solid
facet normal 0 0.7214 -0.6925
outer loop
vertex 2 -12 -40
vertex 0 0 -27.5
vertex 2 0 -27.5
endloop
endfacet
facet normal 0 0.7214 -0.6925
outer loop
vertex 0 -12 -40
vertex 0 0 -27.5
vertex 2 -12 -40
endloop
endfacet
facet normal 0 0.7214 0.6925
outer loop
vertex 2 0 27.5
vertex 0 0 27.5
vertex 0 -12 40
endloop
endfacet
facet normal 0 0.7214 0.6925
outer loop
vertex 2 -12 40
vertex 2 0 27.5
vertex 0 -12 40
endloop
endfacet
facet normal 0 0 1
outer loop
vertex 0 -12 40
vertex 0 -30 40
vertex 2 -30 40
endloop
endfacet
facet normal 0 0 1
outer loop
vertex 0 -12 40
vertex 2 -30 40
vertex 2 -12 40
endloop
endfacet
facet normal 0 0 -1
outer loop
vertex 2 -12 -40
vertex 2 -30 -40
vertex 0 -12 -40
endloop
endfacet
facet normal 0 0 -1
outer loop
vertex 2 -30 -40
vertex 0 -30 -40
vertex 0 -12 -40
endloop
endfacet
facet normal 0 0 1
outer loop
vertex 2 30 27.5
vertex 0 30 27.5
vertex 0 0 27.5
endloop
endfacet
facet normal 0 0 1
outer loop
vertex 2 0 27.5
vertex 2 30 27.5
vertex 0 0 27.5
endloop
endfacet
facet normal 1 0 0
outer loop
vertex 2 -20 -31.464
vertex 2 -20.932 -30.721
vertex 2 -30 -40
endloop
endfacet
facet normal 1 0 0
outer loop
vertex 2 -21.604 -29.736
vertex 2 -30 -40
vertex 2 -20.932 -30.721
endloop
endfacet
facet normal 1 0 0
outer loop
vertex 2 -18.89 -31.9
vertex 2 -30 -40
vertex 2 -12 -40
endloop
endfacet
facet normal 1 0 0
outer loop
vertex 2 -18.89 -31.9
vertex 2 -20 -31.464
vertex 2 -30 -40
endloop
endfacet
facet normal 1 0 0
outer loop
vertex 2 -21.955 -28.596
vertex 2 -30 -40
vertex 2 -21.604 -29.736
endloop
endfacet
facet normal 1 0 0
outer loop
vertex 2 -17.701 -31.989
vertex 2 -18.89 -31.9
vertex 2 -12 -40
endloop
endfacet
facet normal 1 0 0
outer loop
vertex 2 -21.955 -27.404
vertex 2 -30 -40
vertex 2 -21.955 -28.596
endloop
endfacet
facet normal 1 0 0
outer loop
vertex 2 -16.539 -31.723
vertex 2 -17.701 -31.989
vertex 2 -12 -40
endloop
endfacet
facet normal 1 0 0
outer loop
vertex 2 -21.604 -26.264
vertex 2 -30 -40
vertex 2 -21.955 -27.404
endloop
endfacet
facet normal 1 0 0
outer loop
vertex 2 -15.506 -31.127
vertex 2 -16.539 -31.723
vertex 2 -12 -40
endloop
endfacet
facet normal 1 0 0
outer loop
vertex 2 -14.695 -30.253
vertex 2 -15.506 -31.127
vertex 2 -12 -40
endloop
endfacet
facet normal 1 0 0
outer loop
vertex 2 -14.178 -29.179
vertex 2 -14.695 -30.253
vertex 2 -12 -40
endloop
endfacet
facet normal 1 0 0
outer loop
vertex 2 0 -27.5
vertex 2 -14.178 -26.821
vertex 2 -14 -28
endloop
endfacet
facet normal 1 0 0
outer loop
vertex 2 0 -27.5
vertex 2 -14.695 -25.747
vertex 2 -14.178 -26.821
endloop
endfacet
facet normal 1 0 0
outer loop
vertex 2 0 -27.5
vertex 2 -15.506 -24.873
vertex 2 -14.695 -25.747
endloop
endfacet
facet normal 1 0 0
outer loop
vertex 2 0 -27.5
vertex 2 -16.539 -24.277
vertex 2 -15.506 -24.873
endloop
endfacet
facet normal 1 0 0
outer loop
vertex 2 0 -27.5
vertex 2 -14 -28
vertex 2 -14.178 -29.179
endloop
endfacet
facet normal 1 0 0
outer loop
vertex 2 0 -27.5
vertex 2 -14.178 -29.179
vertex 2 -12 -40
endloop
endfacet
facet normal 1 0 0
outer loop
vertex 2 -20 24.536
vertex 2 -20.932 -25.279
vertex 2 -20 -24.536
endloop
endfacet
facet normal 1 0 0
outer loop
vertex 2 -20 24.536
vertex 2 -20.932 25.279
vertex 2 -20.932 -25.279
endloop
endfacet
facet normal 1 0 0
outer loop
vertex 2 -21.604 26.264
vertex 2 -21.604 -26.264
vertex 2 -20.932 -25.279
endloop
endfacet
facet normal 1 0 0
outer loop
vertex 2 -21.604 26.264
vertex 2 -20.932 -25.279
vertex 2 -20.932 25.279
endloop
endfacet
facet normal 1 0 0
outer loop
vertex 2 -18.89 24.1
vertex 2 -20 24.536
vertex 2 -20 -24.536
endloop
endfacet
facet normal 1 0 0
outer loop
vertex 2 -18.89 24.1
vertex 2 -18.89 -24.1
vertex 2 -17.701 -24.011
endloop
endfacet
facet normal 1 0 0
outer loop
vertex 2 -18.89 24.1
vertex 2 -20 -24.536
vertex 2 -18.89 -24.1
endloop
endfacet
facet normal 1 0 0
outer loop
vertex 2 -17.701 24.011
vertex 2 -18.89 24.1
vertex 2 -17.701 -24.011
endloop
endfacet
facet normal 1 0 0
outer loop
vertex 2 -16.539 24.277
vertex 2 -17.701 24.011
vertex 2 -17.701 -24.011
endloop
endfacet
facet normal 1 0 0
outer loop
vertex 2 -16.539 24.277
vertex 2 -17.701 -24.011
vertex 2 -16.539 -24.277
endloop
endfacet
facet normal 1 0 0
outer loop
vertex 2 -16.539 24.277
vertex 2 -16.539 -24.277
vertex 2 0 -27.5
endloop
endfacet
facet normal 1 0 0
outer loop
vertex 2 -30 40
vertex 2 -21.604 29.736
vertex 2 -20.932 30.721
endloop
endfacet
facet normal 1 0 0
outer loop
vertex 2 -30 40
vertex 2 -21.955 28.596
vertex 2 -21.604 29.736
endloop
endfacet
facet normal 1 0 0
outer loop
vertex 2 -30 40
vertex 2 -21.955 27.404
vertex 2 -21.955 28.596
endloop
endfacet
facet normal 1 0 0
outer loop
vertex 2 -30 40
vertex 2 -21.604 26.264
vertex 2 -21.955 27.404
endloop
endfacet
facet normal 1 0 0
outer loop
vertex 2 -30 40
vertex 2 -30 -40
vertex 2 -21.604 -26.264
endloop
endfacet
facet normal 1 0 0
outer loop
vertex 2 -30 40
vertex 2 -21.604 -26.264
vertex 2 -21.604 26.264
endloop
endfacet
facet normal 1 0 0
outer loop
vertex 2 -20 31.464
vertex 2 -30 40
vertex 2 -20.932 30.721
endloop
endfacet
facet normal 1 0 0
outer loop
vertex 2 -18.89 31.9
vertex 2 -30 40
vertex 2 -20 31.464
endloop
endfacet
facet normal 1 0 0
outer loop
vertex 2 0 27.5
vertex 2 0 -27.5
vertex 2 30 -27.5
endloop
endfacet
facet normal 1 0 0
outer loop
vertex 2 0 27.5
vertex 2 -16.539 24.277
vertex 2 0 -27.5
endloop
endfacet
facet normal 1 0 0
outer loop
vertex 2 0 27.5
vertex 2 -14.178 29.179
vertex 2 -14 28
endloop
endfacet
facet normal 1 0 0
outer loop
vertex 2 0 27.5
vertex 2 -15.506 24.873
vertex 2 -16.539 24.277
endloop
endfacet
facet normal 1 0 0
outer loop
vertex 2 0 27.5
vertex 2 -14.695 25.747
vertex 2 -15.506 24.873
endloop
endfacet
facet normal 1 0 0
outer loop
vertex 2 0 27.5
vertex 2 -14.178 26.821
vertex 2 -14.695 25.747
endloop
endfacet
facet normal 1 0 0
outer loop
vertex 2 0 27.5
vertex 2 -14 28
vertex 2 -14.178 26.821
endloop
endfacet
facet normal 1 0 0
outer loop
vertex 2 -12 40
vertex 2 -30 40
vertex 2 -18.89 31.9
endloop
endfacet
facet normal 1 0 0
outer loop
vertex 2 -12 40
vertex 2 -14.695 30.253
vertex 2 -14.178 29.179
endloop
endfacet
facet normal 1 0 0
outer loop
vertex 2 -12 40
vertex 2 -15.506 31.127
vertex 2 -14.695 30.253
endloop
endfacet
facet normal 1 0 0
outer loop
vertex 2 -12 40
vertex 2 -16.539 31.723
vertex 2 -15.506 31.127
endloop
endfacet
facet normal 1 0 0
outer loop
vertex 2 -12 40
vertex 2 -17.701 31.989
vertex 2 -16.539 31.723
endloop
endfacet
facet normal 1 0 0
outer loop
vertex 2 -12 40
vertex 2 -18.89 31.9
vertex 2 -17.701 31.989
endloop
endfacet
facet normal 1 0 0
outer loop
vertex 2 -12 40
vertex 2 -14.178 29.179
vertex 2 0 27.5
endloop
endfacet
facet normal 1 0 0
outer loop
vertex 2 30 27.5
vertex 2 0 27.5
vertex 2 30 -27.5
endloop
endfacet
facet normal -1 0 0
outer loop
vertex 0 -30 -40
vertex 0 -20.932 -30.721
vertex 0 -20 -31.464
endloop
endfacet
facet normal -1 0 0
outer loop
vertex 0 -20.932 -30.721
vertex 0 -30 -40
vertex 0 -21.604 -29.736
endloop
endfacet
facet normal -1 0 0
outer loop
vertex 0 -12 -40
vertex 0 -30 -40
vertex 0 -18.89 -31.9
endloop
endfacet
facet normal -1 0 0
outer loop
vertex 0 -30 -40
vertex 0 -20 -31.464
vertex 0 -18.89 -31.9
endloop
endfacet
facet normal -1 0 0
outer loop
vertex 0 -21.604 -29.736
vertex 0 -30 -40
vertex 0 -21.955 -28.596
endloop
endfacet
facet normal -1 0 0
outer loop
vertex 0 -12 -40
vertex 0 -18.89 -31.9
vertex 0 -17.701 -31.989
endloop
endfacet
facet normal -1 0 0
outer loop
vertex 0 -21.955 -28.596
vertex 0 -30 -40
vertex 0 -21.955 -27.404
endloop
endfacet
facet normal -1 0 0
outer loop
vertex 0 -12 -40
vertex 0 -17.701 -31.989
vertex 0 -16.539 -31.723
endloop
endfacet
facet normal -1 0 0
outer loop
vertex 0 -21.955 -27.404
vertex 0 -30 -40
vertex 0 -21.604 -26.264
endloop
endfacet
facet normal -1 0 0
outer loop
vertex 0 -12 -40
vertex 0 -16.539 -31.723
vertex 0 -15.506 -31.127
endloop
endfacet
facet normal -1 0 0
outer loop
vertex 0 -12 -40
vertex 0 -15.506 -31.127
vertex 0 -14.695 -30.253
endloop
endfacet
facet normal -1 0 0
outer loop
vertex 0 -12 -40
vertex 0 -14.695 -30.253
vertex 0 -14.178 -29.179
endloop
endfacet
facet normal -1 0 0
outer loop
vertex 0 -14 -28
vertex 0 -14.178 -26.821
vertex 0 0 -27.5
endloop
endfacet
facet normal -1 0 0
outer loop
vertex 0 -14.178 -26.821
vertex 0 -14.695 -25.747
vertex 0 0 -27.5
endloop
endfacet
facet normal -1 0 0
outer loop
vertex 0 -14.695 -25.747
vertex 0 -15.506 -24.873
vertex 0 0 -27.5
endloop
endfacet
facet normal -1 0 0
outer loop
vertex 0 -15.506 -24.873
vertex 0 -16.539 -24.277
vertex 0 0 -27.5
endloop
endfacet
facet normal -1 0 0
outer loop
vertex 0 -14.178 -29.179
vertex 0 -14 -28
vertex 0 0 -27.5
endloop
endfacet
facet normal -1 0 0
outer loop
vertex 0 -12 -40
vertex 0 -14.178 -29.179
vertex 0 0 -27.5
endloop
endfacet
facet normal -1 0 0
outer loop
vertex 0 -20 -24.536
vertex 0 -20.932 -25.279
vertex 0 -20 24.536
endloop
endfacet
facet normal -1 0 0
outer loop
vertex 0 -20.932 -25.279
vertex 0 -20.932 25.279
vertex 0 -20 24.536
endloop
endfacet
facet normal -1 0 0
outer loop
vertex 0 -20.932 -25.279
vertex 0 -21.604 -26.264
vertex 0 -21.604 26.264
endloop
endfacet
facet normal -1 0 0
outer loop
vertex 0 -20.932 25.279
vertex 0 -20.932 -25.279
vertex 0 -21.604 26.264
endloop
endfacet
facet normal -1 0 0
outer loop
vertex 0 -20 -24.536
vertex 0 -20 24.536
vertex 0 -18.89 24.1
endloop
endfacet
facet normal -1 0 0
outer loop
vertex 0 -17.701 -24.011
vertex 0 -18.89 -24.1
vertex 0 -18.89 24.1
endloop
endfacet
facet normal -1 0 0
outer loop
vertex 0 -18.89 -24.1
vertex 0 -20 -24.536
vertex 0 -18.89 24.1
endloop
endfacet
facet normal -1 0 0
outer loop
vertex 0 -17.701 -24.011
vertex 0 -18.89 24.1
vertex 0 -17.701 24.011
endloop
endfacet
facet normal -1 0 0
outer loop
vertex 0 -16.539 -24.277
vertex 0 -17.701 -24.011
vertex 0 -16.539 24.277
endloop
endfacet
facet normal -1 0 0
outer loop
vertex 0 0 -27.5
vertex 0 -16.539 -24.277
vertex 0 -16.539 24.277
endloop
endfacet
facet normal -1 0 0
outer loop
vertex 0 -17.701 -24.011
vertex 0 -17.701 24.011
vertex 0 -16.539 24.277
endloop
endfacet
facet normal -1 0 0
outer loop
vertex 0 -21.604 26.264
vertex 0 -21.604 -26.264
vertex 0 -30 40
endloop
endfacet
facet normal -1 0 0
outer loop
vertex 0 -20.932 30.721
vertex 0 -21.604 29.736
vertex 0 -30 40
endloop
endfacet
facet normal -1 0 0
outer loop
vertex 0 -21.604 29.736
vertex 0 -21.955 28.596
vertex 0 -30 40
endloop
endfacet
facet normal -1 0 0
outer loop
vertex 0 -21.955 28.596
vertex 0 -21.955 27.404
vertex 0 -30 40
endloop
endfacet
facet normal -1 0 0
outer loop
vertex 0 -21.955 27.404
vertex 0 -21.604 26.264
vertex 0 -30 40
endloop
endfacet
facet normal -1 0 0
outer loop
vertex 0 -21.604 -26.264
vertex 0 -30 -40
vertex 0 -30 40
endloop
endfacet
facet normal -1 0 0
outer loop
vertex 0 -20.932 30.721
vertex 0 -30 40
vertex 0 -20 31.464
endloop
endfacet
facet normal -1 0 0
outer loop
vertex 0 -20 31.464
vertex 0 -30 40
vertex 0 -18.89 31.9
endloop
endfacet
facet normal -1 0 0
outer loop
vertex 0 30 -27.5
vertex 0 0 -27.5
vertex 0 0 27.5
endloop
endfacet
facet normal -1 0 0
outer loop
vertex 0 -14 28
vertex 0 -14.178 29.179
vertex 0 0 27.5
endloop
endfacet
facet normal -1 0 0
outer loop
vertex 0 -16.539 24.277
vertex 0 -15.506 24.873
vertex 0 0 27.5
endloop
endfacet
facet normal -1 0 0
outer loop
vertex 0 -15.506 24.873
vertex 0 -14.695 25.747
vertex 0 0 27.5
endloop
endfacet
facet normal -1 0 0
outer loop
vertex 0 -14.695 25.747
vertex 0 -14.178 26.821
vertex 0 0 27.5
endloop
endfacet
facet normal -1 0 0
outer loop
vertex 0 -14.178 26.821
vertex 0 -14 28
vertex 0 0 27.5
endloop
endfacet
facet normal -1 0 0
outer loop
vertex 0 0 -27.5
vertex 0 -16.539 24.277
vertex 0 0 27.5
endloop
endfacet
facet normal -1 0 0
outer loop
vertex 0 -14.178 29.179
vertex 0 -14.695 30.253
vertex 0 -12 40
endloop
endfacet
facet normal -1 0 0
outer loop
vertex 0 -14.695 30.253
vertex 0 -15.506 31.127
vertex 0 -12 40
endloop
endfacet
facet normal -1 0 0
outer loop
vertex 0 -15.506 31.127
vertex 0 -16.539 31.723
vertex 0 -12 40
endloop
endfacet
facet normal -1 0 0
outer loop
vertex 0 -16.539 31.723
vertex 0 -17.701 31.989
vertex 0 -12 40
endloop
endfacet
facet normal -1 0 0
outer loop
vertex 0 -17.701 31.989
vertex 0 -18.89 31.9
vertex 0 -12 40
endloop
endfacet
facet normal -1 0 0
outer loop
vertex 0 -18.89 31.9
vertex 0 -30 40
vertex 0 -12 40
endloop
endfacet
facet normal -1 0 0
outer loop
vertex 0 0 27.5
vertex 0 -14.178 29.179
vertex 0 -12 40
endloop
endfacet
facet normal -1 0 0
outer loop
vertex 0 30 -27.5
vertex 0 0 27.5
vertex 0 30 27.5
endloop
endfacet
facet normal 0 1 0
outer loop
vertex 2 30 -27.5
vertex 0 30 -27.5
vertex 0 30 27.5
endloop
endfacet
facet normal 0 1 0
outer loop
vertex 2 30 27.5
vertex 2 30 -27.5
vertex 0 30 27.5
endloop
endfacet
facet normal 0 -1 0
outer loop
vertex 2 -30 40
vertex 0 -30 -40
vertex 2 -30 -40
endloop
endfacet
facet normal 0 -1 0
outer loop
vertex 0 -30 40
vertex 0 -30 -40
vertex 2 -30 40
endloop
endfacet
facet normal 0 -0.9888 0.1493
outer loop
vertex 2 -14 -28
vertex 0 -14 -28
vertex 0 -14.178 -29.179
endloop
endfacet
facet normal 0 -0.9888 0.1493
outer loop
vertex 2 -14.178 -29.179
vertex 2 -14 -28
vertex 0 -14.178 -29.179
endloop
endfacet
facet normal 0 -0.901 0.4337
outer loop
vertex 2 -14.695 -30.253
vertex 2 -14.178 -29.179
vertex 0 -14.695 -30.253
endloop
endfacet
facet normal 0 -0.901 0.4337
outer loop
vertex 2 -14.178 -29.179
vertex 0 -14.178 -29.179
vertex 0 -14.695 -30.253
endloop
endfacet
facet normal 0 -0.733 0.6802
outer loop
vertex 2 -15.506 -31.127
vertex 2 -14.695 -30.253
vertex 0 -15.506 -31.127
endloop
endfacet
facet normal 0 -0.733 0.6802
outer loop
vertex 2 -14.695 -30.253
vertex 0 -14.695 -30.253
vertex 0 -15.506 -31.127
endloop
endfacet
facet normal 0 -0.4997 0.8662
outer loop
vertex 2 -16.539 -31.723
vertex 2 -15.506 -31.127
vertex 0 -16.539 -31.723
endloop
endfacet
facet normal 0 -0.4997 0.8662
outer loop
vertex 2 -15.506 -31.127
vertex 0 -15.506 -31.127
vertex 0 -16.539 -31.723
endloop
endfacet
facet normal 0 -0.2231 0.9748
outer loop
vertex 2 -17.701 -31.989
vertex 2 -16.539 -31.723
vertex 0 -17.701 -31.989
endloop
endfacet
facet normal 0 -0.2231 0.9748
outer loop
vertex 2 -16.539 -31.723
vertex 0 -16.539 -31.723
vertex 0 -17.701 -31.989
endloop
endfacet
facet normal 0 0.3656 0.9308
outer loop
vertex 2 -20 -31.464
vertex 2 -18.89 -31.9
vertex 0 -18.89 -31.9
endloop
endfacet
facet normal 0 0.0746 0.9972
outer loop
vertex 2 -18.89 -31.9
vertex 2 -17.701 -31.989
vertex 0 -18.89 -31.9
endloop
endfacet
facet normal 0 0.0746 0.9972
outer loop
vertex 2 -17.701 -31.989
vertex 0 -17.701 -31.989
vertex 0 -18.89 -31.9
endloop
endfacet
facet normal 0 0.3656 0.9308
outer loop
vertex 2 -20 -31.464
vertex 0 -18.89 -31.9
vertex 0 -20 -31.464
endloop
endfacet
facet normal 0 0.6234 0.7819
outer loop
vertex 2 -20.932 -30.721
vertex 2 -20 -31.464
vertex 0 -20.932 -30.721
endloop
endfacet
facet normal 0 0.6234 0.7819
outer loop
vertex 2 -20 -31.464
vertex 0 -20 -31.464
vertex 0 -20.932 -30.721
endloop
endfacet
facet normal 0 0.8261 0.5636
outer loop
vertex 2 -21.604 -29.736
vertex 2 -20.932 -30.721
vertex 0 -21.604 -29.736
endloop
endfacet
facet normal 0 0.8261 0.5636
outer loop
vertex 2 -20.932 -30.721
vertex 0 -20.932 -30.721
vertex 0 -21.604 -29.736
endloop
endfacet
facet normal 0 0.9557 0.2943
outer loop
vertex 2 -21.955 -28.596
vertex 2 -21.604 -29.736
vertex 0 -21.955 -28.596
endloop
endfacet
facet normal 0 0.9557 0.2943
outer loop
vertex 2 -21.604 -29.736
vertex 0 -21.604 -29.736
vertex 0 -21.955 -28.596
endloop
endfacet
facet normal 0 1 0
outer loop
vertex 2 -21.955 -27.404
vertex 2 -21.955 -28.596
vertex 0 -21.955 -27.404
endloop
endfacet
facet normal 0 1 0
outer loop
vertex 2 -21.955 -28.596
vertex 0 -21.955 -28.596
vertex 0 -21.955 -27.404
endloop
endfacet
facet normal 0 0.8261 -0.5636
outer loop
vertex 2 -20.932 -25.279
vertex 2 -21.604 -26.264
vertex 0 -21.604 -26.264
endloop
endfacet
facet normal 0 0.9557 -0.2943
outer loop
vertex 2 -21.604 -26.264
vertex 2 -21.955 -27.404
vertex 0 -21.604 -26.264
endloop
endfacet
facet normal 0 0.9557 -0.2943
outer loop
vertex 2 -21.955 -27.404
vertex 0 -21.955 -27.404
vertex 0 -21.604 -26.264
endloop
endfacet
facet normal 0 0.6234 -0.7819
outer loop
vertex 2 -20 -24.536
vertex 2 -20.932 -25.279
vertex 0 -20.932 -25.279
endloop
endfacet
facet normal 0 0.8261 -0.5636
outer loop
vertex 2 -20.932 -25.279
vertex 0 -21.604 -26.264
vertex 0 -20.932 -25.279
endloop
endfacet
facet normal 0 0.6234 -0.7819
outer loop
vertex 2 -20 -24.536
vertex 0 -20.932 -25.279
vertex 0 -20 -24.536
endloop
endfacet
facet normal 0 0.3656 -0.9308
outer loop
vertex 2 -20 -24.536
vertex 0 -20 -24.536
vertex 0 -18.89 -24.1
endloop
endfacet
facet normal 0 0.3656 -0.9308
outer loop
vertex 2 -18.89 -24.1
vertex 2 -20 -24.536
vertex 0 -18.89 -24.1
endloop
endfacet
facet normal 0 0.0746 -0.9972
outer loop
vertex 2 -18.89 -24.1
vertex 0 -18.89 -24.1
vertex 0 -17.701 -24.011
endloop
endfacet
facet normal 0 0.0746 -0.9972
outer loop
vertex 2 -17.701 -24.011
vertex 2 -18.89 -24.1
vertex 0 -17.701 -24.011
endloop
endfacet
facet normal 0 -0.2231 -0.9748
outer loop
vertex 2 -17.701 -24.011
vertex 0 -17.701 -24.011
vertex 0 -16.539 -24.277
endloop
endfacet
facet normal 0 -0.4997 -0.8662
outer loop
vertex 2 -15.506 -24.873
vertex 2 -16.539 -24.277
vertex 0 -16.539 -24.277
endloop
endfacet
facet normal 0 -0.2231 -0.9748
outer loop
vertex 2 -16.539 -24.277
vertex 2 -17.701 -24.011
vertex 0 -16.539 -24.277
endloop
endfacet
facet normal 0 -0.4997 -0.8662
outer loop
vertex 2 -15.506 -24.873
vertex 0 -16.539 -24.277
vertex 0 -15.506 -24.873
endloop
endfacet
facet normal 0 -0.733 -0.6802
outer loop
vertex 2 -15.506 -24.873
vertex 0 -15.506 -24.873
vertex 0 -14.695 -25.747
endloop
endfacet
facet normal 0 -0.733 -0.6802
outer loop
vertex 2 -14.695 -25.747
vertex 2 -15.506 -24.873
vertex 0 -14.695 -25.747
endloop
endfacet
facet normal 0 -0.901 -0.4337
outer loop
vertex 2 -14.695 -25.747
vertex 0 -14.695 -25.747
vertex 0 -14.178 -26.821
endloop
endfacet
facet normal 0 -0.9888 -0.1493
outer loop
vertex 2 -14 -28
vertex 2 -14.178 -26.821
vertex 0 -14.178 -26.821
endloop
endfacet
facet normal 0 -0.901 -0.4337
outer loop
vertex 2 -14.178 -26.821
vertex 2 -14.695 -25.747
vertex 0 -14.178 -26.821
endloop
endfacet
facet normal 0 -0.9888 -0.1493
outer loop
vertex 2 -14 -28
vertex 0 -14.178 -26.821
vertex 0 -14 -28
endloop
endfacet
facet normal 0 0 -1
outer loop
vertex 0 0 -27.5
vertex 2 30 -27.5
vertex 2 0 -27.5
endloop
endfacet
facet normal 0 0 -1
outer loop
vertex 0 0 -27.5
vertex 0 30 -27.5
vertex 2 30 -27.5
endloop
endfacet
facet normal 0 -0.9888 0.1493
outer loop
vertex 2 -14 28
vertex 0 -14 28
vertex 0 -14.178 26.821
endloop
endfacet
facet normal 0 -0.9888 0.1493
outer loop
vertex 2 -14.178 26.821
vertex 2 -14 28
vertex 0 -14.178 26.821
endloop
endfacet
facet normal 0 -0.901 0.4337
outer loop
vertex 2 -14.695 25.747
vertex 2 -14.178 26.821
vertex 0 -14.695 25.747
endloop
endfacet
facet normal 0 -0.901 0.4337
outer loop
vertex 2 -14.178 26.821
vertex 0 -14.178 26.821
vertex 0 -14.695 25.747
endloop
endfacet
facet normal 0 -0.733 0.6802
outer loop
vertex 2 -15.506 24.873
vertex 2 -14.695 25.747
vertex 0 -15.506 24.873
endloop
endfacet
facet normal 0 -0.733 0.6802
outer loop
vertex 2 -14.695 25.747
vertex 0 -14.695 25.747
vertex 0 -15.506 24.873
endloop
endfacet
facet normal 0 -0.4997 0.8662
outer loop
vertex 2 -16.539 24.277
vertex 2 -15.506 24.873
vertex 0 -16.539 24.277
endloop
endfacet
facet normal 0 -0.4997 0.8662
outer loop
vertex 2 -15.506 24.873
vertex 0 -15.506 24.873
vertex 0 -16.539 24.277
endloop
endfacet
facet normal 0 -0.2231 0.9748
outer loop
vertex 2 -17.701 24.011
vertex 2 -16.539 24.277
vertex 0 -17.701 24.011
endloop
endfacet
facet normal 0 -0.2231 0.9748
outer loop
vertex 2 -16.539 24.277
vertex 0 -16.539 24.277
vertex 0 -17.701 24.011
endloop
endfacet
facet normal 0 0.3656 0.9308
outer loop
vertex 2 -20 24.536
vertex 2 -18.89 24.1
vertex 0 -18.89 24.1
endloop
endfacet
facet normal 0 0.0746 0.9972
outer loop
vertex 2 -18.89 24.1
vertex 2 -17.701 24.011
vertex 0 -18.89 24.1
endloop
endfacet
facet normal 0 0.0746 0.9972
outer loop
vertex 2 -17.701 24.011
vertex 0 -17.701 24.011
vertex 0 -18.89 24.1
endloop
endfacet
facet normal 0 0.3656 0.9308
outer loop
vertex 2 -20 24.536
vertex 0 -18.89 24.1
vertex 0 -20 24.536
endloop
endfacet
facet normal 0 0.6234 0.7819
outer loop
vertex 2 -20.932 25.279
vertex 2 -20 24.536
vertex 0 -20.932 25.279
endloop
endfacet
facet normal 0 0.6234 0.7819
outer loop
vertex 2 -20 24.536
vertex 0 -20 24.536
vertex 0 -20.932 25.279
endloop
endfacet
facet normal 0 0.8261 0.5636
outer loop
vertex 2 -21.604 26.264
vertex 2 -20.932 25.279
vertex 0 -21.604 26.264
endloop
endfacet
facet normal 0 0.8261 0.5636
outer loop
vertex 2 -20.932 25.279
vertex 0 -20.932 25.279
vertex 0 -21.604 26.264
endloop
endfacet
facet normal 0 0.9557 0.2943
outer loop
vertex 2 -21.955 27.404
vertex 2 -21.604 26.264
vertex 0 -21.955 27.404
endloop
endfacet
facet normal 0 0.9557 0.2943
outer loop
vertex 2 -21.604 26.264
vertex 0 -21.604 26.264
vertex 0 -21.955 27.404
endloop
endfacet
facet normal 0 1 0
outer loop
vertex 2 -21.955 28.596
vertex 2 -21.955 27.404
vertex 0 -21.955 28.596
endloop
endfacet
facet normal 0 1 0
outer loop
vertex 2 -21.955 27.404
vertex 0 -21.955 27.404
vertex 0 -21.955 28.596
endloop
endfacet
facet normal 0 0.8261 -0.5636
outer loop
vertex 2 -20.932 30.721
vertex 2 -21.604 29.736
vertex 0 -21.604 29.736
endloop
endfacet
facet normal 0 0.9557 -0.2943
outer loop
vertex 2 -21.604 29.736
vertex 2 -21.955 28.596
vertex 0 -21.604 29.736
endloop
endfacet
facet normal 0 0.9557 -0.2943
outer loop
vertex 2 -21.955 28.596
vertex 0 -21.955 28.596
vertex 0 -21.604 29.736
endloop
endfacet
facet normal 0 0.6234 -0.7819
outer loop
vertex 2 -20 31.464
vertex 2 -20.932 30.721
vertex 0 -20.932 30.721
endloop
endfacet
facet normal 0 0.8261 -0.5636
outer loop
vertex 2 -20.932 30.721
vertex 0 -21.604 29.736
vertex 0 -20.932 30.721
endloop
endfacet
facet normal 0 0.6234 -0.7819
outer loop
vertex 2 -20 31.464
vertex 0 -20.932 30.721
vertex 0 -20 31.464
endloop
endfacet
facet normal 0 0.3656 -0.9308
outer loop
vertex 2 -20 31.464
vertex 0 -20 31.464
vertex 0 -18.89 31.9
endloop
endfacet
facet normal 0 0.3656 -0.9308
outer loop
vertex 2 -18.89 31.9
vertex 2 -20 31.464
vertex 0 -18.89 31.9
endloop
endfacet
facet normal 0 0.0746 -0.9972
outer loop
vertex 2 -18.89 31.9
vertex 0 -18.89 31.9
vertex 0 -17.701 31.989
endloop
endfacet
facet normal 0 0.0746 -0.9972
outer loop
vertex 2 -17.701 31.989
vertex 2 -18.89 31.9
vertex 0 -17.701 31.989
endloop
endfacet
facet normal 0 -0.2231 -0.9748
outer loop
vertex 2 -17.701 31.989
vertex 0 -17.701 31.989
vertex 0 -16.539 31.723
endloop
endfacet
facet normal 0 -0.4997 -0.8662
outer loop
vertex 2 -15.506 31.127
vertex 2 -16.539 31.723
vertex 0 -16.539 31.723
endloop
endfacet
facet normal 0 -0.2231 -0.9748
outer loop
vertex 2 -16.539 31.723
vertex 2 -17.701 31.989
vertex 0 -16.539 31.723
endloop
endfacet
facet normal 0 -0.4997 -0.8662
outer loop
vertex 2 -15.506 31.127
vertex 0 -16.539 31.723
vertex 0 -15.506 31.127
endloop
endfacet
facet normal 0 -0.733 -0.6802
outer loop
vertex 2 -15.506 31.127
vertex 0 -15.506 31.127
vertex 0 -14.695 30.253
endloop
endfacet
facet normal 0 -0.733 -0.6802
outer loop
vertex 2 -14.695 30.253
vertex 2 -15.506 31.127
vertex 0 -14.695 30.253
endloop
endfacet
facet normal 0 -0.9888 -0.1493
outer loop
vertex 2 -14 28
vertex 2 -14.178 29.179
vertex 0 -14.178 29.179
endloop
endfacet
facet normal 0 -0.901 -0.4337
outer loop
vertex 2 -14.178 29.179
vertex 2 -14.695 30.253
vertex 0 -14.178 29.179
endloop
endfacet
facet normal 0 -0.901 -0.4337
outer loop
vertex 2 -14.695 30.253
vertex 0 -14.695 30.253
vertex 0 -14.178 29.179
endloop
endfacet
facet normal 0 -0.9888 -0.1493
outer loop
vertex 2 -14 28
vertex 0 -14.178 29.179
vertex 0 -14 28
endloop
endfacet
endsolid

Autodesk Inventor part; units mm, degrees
ref_plane "YZ Plane" through (0, 0, 0) normal (1, 0, 0) x (0, 1, 0)
ref_plane "XZ Plane" through (0, 0, 0) normal (0, 1, 0) x (-1, 0, 0)
ref_plane "XY Plane" through (0, 0, 0) normal (0, 0, 1) x (1, 0, 0)
sketch "Эскиз1" plane through (0, 0, 0) normal (1, 0, 0) x (0, 1, 0)
  line L0 (-30, 0) -> (30, 0)
  line L1 (-30, 0) -> (-30, 40)
  line L2 (-30, 40) -> (-12, 40)
  line L3 (30, 0) -> (30, 27.5)
  line L4 (30, 27.5) -> (0, 27.5)
  line L5 (0, 27.5) -> (-12, 40)
  circle A0 centre (-18, 28) radius 4
  line L6 (-30, 0) -> (-30, -40)
  line L7 (-30, -40) -> (-12, -40)
  line L8 (30, 0) -> (30, -27.5)
  line L9 (30, -27.5) -> (0, -27.5)
  line L10 (0, -27.5) -> (-12, -40)
  circle A1 centre (-18, -28) radius 4
  point P0 (0, 0)
  point P1 (0, 0)
  dimension "d1" = 40
  dimension "d2" = 18
  dimension "d3" = 55
  dimension "d4" = 30
  dimension "d5" = 60
  dimension "d6" = 8
  dimension "d7" = 12
  dimension "d8" = 12
extrude "Выдавливание1" add sketch "Эскиз1" along normal blind 2
properties part number "Для иконки" material "Медь"
